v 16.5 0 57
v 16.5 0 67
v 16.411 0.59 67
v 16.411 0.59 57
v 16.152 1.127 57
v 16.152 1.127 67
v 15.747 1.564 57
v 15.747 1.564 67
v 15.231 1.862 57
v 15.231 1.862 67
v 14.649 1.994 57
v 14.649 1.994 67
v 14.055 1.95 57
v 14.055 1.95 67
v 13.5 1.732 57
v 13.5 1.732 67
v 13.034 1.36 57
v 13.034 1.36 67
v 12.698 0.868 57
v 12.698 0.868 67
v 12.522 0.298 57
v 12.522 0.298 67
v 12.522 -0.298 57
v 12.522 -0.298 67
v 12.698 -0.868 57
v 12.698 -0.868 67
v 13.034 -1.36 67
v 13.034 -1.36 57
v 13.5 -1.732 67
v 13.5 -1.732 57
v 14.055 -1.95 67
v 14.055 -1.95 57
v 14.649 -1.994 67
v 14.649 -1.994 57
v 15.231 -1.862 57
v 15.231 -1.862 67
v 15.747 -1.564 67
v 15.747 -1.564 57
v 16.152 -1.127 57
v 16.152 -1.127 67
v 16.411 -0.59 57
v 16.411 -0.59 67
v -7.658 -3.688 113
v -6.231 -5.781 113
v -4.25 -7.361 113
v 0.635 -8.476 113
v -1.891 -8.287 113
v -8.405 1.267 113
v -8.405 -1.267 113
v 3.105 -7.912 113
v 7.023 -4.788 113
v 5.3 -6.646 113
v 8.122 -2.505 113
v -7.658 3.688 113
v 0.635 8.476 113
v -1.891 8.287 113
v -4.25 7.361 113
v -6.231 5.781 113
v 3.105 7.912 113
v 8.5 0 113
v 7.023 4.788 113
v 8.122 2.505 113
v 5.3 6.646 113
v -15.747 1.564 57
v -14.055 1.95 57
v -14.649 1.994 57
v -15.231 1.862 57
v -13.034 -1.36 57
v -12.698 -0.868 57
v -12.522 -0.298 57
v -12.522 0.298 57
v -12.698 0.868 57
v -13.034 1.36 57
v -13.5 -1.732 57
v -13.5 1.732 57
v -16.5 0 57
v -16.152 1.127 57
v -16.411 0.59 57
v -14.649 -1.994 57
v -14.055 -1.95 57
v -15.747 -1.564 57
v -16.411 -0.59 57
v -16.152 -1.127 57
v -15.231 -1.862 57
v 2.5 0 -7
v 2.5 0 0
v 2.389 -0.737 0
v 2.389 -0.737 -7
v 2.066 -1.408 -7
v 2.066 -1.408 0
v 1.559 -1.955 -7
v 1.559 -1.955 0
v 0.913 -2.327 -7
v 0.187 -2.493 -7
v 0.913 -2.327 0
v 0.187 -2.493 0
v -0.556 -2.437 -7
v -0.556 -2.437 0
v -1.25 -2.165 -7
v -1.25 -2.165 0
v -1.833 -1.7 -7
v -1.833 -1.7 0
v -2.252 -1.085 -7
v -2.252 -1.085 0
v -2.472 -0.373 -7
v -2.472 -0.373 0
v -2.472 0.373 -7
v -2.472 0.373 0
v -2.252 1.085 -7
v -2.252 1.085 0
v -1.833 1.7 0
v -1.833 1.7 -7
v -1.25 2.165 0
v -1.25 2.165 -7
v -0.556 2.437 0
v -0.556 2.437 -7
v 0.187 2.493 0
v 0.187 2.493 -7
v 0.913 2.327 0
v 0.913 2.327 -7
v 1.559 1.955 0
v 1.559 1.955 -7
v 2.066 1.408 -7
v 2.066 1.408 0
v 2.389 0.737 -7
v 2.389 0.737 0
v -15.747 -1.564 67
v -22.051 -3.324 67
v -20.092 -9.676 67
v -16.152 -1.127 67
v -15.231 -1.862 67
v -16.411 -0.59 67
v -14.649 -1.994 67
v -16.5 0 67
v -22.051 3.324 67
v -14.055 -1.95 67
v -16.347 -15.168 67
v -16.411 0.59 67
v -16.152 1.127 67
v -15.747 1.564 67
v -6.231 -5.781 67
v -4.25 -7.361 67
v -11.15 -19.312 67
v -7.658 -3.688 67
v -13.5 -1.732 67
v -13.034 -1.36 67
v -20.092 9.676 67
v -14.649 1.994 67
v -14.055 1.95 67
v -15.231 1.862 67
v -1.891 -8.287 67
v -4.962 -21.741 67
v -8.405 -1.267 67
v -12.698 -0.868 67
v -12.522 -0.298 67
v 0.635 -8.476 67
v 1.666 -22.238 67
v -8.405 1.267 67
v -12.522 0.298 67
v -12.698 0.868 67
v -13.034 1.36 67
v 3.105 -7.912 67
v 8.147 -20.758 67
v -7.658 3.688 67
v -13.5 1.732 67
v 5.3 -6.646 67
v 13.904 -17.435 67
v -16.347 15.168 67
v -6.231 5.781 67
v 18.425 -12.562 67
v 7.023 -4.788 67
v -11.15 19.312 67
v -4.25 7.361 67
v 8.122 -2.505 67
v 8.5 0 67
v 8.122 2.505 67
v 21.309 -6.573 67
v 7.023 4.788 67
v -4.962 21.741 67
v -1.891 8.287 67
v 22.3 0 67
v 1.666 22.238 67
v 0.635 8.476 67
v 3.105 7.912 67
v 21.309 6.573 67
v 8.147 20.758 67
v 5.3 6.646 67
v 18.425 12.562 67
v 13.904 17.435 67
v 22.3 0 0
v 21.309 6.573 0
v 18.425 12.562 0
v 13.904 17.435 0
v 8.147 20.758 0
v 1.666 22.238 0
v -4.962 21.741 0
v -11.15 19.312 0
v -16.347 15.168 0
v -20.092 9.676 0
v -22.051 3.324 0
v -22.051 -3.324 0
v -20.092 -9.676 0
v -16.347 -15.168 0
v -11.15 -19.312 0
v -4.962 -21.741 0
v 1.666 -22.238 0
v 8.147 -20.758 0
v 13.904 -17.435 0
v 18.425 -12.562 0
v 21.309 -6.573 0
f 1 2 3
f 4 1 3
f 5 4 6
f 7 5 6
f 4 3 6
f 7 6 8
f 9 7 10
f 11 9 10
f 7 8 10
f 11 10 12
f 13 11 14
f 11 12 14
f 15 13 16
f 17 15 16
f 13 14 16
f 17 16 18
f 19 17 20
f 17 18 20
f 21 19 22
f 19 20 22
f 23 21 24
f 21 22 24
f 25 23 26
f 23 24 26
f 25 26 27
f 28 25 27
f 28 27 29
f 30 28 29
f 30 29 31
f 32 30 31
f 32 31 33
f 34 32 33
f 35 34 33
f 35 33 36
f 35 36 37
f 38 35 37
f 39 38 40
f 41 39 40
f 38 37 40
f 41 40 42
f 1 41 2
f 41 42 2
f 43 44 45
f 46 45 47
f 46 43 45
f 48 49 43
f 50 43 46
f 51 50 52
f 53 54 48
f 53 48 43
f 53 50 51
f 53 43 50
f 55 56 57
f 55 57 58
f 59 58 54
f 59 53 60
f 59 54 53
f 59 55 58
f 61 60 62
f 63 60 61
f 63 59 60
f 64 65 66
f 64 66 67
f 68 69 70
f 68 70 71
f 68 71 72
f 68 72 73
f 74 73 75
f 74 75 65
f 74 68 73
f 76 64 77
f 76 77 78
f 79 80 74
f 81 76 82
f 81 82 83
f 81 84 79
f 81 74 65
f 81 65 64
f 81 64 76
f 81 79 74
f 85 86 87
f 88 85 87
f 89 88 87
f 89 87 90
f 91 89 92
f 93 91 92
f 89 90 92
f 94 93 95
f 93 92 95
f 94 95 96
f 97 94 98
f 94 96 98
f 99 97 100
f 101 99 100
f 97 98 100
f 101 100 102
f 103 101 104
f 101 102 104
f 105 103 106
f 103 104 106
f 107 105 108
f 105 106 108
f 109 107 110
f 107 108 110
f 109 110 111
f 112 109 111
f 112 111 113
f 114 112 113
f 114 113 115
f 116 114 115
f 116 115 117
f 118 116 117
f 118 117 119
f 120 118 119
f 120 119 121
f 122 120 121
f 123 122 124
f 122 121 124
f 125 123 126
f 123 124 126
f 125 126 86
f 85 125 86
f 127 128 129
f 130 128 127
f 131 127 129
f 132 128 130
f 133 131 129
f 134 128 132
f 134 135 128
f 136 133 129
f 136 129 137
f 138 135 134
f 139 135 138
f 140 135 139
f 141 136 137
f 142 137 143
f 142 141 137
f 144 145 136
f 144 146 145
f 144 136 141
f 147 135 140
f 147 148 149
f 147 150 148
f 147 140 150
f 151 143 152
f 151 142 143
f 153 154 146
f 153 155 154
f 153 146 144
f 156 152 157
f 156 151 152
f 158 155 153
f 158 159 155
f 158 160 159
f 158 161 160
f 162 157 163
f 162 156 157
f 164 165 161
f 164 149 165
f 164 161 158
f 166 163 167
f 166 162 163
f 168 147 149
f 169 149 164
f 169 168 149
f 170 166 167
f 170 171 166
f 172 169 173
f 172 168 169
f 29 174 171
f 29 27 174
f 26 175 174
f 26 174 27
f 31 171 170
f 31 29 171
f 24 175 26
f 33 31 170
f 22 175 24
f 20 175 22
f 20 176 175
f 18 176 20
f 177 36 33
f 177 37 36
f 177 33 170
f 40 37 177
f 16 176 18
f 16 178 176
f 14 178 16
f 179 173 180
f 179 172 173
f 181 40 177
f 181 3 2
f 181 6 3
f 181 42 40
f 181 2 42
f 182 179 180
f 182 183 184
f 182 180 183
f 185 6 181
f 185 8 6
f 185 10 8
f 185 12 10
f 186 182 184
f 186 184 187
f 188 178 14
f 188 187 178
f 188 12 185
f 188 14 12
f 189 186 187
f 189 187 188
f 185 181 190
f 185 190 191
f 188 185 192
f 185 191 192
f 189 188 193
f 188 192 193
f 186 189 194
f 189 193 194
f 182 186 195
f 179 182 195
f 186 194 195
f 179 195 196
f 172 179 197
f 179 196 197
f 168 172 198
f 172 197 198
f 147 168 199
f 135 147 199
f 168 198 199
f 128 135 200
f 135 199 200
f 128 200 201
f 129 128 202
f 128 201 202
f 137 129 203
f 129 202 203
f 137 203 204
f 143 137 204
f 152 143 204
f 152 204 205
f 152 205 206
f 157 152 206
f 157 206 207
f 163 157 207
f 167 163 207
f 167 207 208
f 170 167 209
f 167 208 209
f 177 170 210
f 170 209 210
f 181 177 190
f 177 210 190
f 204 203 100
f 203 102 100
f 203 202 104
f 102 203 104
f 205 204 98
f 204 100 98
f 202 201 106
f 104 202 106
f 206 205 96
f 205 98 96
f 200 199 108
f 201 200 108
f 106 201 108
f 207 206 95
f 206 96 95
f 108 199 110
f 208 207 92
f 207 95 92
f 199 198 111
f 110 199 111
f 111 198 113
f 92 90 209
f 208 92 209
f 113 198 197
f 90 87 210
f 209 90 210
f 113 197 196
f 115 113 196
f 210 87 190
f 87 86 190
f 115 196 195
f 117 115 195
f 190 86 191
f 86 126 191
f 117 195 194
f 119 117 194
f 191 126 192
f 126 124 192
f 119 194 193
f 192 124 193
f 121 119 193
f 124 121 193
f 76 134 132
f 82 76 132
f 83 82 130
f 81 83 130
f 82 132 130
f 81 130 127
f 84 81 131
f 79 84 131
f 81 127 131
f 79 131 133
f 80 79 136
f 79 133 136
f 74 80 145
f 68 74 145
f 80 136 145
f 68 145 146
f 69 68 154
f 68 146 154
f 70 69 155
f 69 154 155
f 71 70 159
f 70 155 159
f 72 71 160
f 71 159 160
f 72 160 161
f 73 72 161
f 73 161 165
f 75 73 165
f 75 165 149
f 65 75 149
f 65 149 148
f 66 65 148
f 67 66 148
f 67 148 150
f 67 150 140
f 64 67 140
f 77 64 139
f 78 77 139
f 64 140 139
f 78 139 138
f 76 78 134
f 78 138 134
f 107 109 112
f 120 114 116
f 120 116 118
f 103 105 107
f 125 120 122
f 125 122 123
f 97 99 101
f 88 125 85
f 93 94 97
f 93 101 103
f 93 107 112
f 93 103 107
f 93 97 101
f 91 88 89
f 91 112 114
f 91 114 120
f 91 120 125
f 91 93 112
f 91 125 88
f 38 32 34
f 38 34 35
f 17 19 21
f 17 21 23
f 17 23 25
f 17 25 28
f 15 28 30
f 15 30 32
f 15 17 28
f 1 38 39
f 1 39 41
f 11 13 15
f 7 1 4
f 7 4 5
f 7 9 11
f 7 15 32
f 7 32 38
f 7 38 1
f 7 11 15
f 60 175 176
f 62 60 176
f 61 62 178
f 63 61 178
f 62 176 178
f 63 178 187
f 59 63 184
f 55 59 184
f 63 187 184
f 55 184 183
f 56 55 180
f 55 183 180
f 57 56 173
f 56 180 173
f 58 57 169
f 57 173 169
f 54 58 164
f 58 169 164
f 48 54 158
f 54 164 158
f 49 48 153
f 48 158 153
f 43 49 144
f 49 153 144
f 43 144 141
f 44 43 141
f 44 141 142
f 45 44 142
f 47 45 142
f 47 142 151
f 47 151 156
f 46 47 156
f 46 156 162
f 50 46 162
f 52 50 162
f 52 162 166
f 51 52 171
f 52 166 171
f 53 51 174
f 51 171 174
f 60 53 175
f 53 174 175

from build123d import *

# Parameters (mm, degrees)
SKETCH_1_R          = 22.3
EXTRUDE_1_DEPTH     = 67
SKETCH_2_R          = 8.5
EXTRUDE_2_DEPTH     = 46
SKETCH_3_R          = 2.5
EXTRUDE_3_DEPTH     = 7
SKETCH_4_R          = 2
CUT_EXTRUDE_1_DEPTH = 10


with BuildPart() as part:
    # 草圖1 → 填料-伸長1 (new body)
    with BuildSketch(Plane.XY):
        Circle(SKETCH_1_R)
    extrude(amount=EXTRUDE_1_DEPTH)

    # 草圖2 → 填料-伸長2 (add)
    with BuildSketch(Plane.XY.offset(67)):
        Circle(SKETCH_2_R)
    extrude(amount=EXTRUDE_2_DEPTH)

    # 草圖3 → 填料-伸長3 (add)
    with BuildSketch(Plane(origin=(0, 0, 0), x_dir=(-1, 0, 0), z_dir=(0, 0, -1))):
        with Locations(Location((0, 0, 0), (0, 0, 180))):
            Circle(SKETCH_3_R)
    extrude(amount=EXTRUDE_3_DEPTH)

    # 草圖4 → 除料-伸長1 (cut)
    with BuildSketch(Plane.XY.offset(67)):
        with Locations((14.5, 0)):
            Circle(SKETCH_4_R)
        with Locations(Location((-14.5, 0, 0), (0, 0, 180))):
            Circle(SKETCH_4_R)
    extrude(amount=-CUT_EXTRUDE_1_DEPTH, mode=Mode.SUBTRACT)


solid = part.part
